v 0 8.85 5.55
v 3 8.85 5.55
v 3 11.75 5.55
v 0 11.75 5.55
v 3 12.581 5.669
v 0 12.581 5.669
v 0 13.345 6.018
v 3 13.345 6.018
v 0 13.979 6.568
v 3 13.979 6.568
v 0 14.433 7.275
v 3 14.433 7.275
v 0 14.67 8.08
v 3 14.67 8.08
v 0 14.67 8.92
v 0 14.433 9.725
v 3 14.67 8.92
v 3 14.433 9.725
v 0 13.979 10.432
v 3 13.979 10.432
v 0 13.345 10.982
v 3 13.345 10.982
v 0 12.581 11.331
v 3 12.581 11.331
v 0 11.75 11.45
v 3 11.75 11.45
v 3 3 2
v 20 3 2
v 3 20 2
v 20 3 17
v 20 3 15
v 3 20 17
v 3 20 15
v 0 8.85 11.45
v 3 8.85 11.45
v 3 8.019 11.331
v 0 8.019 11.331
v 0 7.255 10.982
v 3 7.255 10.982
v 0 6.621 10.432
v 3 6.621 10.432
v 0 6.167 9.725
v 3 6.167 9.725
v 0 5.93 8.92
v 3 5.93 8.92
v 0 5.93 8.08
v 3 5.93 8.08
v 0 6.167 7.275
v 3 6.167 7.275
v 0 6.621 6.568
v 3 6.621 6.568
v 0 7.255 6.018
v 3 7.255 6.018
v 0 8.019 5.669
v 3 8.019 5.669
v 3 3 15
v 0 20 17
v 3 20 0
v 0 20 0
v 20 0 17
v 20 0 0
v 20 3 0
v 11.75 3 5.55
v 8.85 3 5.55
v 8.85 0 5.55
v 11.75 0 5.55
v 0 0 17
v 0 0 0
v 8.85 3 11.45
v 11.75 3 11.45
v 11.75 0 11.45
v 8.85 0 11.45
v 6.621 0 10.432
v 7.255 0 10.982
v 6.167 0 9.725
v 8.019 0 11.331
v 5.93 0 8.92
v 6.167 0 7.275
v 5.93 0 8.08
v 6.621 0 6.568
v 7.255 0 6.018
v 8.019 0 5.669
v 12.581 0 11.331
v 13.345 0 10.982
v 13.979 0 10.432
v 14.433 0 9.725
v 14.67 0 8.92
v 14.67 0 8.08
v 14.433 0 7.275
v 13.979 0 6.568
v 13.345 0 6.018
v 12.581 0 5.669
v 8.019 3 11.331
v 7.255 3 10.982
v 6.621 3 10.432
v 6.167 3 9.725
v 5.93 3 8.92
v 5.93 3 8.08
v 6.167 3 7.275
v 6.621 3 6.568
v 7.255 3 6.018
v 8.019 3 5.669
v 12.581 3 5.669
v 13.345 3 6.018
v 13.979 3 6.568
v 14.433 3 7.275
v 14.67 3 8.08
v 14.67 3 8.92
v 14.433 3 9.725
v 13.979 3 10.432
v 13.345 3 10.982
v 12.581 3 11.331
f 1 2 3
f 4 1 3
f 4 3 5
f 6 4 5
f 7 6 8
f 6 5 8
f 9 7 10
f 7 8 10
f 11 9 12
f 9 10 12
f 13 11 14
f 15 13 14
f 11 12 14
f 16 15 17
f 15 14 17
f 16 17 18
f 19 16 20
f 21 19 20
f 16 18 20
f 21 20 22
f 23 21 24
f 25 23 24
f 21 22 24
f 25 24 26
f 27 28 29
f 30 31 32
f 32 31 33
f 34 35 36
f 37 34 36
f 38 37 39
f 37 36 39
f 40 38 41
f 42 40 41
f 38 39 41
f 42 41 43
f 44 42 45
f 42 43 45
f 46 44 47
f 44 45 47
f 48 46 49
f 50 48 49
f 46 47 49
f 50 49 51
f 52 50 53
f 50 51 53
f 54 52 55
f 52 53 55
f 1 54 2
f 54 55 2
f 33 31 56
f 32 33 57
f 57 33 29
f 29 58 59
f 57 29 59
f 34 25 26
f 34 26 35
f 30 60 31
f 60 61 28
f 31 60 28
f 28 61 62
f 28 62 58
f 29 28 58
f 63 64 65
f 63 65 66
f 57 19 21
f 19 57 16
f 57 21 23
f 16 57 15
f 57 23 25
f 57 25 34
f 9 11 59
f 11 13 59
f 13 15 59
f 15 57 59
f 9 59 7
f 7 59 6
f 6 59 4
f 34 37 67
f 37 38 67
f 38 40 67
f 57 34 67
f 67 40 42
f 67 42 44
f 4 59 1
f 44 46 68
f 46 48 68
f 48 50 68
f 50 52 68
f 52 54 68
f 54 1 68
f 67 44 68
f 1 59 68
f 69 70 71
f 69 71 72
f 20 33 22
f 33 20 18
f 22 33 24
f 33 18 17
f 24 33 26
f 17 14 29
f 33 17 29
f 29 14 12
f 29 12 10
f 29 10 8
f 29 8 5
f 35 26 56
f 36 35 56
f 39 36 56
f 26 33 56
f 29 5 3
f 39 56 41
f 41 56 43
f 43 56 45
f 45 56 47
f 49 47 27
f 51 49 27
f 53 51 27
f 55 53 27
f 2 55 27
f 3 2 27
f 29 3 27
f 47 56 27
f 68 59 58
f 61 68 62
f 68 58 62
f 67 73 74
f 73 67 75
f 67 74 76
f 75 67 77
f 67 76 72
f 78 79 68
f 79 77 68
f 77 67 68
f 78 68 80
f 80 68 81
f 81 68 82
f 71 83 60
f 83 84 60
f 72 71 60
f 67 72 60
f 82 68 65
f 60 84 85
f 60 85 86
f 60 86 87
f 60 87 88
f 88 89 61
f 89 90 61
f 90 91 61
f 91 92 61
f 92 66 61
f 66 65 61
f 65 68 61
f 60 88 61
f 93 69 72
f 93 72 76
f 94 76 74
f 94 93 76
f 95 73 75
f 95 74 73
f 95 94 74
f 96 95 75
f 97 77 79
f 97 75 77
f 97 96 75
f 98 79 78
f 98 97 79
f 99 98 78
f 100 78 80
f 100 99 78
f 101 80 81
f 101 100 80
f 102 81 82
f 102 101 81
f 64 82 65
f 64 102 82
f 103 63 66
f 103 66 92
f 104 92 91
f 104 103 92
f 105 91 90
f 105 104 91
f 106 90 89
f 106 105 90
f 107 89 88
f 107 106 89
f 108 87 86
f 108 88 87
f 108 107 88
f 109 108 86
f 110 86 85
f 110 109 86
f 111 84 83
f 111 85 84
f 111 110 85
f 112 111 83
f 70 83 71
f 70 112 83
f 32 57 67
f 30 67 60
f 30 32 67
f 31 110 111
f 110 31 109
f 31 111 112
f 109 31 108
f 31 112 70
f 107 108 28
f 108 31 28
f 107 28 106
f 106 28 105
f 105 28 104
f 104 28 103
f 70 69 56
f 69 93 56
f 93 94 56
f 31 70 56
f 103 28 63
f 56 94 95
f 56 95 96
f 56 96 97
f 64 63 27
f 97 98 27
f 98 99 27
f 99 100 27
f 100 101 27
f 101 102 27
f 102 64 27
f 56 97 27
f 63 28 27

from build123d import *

# Parameters (mm, degrees)
EXTRUDE_1_DEPTH     = 17
SKETCH_2_W          = 17
SKETCH_2_H          = 13
CUT_EXTRUDE_1_DEPTH = 18
CUT_EXTRUDE_2_DEPTH = 4


with BuildPart() as part:
    # 草图1 → 凸台-拉伸1 (new body)
    with BuildSketch(Plane.XY):
        Polygon((0, 0), (20, 0), (20, 3), (3, 20), (0, 20), align=None)
    extrude(amount=EXTRUDE_1_DEPTH)

    # 草图2 → 切除-拉伸1 (cut, through all)
    with BuildSketch(Plane(origin=(0, 3, 0), x_dir=(-1, 0, 0), z_dir=(0, -1, 0))):
        with Locations((-11.5, -8.5)):
            Rectangle(SKETCH_2_W, SKETCH_2_H)
    extrude(amount=-CUT_EXTRUDE_1_DEPTH, mode=Mode.SUBTRACT)

    # 草图5 → 切除-拉伸2 (cut, through all)
    with BuildSketch(Plane(origin=(0, 3, 0), x_dir=(1, 0, 0), z_dir=(0, 1, 0))):
        with BuildLine():
            Line((11.75, -11.45), (8.85, -11.45))
            ThreePointArc((8.85, -11.45), (5.9, -8.5), (8.85, -5.55))
            Line((8.85, -5.55), (11.75, -5.55))
            ThreePointArc((11.75, -5.55), (14.7, -8.5), (11.75, -11.45))
        make_face()
    cut_extrude_2 = extrude(amount=-CUT_EXTRUDE_2_DEPTH, mode=Mode.SUBTRACT)

    # 镜向1: 切除-拉伸2 across plane
    add(cut_extrude_2.mirror(Plane(origin=(0, 0, 0), x_dir=(0, 0, 1), z_dir=(0.707106781, -0.707106781, 0))), mode=Mode.SUBTRACT)


solid = part.part
